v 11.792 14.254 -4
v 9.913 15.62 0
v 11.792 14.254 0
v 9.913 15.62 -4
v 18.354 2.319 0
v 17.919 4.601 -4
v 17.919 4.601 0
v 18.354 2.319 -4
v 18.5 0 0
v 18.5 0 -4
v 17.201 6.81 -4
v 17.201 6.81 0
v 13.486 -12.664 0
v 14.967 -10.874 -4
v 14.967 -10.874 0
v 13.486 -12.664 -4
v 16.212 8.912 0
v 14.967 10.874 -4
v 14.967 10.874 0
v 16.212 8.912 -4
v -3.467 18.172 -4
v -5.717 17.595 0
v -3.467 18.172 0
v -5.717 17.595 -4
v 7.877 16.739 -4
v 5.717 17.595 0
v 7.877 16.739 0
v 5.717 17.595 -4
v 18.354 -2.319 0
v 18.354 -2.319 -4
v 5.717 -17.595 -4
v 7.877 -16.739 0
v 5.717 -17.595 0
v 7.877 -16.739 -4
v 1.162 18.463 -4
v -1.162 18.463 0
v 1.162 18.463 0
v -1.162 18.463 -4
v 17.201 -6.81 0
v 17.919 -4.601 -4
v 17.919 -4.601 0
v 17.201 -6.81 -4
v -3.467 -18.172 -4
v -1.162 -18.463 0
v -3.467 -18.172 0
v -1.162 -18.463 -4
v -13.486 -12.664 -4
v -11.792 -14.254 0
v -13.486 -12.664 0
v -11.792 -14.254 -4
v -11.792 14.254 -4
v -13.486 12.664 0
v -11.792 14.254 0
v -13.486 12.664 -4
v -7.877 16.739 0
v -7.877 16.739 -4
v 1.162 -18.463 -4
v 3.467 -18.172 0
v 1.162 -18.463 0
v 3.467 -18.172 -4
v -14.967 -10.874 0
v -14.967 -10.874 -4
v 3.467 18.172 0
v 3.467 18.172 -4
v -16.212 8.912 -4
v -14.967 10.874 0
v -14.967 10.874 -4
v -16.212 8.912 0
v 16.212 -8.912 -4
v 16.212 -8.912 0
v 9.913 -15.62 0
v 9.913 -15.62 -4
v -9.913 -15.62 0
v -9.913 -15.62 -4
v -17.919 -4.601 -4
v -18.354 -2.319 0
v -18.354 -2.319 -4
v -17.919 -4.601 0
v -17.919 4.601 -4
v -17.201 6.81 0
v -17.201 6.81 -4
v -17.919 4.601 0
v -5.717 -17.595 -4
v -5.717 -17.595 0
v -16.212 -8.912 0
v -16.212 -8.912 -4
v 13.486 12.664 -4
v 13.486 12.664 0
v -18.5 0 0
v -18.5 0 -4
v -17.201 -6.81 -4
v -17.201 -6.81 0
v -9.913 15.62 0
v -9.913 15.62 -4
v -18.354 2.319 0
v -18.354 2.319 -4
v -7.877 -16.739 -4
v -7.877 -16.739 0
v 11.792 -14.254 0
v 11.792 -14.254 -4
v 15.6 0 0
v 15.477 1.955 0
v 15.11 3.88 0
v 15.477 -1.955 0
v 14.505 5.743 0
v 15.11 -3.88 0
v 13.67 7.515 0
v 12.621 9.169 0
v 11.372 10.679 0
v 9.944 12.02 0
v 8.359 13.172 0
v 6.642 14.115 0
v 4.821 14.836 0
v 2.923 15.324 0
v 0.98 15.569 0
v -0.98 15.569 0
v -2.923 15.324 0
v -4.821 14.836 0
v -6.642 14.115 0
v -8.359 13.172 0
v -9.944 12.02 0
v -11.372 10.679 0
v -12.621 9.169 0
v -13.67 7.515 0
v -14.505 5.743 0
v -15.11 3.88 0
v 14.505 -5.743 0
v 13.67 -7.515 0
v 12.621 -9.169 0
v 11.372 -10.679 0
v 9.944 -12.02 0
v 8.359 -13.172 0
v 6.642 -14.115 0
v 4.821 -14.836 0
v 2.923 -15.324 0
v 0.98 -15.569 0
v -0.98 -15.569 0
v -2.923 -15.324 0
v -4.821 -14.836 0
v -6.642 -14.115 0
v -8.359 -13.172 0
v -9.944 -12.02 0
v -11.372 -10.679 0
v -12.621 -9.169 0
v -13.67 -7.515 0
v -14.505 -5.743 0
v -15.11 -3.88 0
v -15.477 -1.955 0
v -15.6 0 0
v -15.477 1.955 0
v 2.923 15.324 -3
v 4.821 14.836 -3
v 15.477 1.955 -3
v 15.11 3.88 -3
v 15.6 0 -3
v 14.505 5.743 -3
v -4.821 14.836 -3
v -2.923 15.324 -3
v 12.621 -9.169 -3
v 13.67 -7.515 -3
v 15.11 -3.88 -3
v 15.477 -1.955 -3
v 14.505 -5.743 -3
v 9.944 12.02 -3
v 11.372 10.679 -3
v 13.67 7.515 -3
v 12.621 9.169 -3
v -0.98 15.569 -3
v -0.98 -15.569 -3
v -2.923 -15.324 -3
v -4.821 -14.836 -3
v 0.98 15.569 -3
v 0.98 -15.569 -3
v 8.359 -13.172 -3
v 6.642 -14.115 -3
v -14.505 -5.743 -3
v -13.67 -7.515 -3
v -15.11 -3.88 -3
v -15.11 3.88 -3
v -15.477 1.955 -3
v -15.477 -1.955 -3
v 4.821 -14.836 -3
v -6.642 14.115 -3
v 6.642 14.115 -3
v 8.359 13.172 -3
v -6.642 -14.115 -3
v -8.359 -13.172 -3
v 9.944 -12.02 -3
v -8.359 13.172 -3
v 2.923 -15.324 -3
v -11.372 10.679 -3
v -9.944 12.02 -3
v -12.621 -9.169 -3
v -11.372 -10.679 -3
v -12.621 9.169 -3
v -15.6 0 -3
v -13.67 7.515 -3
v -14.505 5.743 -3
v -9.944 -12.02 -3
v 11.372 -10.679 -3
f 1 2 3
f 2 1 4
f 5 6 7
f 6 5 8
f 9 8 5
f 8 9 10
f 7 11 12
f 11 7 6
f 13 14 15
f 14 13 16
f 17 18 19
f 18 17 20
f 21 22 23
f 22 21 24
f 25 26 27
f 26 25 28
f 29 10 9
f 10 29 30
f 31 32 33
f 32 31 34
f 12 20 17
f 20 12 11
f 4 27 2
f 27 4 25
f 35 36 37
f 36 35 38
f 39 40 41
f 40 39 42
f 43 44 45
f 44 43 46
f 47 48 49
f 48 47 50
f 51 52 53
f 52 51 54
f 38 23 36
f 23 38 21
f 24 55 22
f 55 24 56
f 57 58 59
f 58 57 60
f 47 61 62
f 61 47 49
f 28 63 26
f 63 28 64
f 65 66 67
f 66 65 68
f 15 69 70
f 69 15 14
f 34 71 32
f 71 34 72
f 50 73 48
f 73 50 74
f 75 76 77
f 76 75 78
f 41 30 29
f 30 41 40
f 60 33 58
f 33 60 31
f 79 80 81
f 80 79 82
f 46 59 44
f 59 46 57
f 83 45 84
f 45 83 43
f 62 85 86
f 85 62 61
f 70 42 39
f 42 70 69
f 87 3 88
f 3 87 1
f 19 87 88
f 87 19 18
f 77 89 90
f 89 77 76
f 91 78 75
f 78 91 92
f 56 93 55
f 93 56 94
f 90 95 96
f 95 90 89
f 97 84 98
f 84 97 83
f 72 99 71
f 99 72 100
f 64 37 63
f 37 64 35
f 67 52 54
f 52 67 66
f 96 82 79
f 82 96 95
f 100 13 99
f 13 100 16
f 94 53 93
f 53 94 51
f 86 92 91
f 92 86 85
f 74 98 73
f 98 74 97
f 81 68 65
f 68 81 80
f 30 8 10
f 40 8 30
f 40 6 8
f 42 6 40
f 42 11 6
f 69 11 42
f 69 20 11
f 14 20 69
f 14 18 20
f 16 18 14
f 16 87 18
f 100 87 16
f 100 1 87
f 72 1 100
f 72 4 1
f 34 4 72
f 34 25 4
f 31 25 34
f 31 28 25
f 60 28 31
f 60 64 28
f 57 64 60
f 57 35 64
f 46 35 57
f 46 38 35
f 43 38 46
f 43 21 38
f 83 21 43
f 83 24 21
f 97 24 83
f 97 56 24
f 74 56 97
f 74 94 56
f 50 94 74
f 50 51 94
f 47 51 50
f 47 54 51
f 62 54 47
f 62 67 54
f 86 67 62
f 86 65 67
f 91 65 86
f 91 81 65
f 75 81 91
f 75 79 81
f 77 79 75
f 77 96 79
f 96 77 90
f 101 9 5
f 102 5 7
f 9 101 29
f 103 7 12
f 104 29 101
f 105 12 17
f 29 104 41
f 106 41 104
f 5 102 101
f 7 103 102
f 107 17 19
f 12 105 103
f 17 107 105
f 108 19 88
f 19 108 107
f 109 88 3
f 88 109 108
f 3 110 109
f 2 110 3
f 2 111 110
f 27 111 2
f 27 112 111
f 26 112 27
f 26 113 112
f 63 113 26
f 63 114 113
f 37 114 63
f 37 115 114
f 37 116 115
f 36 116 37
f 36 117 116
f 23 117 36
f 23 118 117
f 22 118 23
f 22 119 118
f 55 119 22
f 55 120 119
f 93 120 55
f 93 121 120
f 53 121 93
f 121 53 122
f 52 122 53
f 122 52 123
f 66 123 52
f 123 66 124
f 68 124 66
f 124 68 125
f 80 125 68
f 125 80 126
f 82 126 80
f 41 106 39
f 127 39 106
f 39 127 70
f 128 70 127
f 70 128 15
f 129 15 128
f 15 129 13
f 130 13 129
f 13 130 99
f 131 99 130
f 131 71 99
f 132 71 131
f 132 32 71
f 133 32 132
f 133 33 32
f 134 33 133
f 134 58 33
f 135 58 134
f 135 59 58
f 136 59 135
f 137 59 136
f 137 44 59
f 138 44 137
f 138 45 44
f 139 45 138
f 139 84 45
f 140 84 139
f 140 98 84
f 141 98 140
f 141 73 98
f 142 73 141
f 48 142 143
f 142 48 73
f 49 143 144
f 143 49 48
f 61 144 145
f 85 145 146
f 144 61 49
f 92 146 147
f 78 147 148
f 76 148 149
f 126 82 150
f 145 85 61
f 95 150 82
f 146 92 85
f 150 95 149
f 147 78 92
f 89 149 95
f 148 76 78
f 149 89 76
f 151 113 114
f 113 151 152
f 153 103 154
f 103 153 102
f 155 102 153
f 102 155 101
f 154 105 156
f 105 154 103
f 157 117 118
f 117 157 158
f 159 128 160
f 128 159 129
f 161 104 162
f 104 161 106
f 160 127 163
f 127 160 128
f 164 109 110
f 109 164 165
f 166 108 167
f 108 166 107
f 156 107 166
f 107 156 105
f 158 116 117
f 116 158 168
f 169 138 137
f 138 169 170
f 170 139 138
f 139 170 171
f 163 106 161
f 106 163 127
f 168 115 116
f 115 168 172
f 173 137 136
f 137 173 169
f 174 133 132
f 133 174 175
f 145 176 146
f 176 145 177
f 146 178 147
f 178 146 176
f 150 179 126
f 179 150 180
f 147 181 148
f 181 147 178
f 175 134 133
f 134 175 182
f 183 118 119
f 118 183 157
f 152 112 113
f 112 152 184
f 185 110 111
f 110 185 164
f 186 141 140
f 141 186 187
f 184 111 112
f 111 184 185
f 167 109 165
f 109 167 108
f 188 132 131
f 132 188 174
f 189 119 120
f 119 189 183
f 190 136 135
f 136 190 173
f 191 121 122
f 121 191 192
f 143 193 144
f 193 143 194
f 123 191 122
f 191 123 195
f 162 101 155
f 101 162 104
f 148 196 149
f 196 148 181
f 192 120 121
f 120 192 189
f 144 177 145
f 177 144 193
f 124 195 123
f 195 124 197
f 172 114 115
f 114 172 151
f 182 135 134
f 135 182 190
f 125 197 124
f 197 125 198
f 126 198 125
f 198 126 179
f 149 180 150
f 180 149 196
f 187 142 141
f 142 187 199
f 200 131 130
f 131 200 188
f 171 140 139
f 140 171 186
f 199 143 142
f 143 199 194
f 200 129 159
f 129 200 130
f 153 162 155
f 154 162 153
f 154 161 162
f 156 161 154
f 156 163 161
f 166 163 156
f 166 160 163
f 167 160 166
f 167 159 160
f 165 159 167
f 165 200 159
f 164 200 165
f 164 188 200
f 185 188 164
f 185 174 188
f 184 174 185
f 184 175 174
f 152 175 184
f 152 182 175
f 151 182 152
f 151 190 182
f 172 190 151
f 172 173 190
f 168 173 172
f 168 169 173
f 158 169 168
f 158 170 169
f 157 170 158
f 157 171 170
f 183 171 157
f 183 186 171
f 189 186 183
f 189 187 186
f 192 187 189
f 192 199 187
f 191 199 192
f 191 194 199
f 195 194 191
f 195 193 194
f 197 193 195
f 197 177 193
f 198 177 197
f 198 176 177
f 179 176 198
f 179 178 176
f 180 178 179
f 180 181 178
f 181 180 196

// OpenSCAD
$fn = 50;


difference() {
	union() {
		translate(v = [0, 0, -4.0000000000]) {
			cylinder(h = 4, r = 18.5000000000);
		}
	}
	union() {
		#translate(v = [0, 0, -3.0000000000]) {
			cylinder(h = 3, r = 15.6000000000);
		}
	}
}
